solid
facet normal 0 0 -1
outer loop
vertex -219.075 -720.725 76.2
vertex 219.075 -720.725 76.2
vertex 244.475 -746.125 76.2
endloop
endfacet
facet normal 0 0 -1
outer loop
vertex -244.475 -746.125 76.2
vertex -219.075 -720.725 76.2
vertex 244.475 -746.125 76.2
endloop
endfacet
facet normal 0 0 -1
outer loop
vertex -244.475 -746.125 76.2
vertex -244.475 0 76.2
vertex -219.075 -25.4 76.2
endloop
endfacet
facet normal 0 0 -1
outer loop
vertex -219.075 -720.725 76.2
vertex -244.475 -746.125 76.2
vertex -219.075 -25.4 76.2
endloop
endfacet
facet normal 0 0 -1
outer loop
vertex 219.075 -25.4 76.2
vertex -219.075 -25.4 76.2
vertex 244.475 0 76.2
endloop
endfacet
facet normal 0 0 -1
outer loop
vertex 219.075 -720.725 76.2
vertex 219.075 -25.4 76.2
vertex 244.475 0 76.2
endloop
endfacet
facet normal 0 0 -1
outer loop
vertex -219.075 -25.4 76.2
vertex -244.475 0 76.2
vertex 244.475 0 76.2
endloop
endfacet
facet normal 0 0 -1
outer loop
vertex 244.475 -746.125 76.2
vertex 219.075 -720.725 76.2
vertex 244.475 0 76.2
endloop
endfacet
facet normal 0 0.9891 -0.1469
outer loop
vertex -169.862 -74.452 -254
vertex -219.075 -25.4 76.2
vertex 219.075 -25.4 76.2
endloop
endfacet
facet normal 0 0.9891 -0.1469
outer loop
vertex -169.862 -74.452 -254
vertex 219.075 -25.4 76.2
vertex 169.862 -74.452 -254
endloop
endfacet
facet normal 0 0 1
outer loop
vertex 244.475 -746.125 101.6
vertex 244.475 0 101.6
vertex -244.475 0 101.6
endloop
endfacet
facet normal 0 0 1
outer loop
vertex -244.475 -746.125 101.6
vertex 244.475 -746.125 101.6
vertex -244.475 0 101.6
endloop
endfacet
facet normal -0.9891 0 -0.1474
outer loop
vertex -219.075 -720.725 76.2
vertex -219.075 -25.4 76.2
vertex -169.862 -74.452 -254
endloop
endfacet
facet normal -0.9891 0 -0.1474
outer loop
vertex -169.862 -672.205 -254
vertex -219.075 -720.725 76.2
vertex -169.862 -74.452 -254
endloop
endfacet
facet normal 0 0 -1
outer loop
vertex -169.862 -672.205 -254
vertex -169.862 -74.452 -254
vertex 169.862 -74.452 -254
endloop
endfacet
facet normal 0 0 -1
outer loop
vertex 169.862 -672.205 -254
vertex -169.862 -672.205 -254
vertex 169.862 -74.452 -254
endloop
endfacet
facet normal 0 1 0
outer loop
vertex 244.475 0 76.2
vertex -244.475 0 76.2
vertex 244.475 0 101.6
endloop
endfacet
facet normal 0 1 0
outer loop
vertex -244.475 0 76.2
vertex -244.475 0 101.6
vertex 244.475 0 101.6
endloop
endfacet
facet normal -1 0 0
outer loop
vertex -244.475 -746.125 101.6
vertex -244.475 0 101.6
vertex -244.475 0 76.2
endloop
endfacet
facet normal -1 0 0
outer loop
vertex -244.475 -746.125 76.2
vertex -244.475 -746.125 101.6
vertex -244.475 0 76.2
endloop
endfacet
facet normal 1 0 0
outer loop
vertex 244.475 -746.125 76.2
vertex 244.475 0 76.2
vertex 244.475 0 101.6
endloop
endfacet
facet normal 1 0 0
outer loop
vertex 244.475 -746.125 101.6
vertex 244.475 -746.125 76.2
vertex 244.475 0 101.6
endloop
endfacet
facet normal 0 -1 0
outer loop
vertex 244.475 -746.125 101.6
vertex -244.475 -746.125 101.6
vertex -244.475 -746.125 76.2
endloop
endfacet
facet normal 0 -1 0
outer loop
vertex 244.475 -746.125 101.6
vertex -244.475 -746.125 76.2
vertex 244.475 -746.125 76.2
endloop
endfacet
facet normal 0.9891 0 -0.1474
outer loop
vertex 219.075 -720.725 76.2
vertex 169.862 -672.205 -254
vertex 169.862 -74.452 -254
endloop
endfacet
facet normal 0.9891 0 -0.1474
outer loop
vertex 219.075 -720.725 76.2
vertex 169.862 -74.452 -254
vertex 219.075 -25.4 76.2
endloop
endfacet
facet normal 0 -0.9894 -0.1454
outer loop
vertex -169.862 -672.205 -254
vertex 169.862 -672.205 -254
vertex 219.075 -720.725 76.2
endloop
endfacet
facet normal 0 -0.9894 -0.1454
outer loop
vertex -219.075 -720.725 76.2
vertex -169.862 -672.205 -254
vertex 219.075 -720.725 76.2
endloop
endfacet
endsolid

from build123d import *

# Parameters (mm, degrees)
F1_DEPTH = 746.125
F3_DEPTH = 1270


with BuildPart() as f1:
    # F0 (on Front) → F1 (new body)
    with BuildSketch(Plane.XZ):
        Polygon((219.075, 76.2), (-219.075, 76.2), (-169.8625, -254), (169.8625, -254), align=None)
        Polygon((-244.475, 76.2), (-219.075, 76.2), (219.075, 76.2), (244.475, 76.2), (244.475, 101.6), (-244.475, 101.6), align=None)
    extrude(amount=F1_DEPTH)

    # F2 (on face) → F3 (cut)
    with BuildSketch(Plane.YZ.offset(244.475)):
        Polygon((-720.725, 76.2), (-746.125, 76.2), (-746.125, -258.798808), (-671.4998, -258.798808), align=None)
        Polygon((0, -255.167246), (0, 76.2), (-25.4, 76.2), (-74.6252, -255.167246), align=None)
    extrude(amount=-F3_DEPTH, mode=Mode.SUBTRACT)


solid = f1.part
